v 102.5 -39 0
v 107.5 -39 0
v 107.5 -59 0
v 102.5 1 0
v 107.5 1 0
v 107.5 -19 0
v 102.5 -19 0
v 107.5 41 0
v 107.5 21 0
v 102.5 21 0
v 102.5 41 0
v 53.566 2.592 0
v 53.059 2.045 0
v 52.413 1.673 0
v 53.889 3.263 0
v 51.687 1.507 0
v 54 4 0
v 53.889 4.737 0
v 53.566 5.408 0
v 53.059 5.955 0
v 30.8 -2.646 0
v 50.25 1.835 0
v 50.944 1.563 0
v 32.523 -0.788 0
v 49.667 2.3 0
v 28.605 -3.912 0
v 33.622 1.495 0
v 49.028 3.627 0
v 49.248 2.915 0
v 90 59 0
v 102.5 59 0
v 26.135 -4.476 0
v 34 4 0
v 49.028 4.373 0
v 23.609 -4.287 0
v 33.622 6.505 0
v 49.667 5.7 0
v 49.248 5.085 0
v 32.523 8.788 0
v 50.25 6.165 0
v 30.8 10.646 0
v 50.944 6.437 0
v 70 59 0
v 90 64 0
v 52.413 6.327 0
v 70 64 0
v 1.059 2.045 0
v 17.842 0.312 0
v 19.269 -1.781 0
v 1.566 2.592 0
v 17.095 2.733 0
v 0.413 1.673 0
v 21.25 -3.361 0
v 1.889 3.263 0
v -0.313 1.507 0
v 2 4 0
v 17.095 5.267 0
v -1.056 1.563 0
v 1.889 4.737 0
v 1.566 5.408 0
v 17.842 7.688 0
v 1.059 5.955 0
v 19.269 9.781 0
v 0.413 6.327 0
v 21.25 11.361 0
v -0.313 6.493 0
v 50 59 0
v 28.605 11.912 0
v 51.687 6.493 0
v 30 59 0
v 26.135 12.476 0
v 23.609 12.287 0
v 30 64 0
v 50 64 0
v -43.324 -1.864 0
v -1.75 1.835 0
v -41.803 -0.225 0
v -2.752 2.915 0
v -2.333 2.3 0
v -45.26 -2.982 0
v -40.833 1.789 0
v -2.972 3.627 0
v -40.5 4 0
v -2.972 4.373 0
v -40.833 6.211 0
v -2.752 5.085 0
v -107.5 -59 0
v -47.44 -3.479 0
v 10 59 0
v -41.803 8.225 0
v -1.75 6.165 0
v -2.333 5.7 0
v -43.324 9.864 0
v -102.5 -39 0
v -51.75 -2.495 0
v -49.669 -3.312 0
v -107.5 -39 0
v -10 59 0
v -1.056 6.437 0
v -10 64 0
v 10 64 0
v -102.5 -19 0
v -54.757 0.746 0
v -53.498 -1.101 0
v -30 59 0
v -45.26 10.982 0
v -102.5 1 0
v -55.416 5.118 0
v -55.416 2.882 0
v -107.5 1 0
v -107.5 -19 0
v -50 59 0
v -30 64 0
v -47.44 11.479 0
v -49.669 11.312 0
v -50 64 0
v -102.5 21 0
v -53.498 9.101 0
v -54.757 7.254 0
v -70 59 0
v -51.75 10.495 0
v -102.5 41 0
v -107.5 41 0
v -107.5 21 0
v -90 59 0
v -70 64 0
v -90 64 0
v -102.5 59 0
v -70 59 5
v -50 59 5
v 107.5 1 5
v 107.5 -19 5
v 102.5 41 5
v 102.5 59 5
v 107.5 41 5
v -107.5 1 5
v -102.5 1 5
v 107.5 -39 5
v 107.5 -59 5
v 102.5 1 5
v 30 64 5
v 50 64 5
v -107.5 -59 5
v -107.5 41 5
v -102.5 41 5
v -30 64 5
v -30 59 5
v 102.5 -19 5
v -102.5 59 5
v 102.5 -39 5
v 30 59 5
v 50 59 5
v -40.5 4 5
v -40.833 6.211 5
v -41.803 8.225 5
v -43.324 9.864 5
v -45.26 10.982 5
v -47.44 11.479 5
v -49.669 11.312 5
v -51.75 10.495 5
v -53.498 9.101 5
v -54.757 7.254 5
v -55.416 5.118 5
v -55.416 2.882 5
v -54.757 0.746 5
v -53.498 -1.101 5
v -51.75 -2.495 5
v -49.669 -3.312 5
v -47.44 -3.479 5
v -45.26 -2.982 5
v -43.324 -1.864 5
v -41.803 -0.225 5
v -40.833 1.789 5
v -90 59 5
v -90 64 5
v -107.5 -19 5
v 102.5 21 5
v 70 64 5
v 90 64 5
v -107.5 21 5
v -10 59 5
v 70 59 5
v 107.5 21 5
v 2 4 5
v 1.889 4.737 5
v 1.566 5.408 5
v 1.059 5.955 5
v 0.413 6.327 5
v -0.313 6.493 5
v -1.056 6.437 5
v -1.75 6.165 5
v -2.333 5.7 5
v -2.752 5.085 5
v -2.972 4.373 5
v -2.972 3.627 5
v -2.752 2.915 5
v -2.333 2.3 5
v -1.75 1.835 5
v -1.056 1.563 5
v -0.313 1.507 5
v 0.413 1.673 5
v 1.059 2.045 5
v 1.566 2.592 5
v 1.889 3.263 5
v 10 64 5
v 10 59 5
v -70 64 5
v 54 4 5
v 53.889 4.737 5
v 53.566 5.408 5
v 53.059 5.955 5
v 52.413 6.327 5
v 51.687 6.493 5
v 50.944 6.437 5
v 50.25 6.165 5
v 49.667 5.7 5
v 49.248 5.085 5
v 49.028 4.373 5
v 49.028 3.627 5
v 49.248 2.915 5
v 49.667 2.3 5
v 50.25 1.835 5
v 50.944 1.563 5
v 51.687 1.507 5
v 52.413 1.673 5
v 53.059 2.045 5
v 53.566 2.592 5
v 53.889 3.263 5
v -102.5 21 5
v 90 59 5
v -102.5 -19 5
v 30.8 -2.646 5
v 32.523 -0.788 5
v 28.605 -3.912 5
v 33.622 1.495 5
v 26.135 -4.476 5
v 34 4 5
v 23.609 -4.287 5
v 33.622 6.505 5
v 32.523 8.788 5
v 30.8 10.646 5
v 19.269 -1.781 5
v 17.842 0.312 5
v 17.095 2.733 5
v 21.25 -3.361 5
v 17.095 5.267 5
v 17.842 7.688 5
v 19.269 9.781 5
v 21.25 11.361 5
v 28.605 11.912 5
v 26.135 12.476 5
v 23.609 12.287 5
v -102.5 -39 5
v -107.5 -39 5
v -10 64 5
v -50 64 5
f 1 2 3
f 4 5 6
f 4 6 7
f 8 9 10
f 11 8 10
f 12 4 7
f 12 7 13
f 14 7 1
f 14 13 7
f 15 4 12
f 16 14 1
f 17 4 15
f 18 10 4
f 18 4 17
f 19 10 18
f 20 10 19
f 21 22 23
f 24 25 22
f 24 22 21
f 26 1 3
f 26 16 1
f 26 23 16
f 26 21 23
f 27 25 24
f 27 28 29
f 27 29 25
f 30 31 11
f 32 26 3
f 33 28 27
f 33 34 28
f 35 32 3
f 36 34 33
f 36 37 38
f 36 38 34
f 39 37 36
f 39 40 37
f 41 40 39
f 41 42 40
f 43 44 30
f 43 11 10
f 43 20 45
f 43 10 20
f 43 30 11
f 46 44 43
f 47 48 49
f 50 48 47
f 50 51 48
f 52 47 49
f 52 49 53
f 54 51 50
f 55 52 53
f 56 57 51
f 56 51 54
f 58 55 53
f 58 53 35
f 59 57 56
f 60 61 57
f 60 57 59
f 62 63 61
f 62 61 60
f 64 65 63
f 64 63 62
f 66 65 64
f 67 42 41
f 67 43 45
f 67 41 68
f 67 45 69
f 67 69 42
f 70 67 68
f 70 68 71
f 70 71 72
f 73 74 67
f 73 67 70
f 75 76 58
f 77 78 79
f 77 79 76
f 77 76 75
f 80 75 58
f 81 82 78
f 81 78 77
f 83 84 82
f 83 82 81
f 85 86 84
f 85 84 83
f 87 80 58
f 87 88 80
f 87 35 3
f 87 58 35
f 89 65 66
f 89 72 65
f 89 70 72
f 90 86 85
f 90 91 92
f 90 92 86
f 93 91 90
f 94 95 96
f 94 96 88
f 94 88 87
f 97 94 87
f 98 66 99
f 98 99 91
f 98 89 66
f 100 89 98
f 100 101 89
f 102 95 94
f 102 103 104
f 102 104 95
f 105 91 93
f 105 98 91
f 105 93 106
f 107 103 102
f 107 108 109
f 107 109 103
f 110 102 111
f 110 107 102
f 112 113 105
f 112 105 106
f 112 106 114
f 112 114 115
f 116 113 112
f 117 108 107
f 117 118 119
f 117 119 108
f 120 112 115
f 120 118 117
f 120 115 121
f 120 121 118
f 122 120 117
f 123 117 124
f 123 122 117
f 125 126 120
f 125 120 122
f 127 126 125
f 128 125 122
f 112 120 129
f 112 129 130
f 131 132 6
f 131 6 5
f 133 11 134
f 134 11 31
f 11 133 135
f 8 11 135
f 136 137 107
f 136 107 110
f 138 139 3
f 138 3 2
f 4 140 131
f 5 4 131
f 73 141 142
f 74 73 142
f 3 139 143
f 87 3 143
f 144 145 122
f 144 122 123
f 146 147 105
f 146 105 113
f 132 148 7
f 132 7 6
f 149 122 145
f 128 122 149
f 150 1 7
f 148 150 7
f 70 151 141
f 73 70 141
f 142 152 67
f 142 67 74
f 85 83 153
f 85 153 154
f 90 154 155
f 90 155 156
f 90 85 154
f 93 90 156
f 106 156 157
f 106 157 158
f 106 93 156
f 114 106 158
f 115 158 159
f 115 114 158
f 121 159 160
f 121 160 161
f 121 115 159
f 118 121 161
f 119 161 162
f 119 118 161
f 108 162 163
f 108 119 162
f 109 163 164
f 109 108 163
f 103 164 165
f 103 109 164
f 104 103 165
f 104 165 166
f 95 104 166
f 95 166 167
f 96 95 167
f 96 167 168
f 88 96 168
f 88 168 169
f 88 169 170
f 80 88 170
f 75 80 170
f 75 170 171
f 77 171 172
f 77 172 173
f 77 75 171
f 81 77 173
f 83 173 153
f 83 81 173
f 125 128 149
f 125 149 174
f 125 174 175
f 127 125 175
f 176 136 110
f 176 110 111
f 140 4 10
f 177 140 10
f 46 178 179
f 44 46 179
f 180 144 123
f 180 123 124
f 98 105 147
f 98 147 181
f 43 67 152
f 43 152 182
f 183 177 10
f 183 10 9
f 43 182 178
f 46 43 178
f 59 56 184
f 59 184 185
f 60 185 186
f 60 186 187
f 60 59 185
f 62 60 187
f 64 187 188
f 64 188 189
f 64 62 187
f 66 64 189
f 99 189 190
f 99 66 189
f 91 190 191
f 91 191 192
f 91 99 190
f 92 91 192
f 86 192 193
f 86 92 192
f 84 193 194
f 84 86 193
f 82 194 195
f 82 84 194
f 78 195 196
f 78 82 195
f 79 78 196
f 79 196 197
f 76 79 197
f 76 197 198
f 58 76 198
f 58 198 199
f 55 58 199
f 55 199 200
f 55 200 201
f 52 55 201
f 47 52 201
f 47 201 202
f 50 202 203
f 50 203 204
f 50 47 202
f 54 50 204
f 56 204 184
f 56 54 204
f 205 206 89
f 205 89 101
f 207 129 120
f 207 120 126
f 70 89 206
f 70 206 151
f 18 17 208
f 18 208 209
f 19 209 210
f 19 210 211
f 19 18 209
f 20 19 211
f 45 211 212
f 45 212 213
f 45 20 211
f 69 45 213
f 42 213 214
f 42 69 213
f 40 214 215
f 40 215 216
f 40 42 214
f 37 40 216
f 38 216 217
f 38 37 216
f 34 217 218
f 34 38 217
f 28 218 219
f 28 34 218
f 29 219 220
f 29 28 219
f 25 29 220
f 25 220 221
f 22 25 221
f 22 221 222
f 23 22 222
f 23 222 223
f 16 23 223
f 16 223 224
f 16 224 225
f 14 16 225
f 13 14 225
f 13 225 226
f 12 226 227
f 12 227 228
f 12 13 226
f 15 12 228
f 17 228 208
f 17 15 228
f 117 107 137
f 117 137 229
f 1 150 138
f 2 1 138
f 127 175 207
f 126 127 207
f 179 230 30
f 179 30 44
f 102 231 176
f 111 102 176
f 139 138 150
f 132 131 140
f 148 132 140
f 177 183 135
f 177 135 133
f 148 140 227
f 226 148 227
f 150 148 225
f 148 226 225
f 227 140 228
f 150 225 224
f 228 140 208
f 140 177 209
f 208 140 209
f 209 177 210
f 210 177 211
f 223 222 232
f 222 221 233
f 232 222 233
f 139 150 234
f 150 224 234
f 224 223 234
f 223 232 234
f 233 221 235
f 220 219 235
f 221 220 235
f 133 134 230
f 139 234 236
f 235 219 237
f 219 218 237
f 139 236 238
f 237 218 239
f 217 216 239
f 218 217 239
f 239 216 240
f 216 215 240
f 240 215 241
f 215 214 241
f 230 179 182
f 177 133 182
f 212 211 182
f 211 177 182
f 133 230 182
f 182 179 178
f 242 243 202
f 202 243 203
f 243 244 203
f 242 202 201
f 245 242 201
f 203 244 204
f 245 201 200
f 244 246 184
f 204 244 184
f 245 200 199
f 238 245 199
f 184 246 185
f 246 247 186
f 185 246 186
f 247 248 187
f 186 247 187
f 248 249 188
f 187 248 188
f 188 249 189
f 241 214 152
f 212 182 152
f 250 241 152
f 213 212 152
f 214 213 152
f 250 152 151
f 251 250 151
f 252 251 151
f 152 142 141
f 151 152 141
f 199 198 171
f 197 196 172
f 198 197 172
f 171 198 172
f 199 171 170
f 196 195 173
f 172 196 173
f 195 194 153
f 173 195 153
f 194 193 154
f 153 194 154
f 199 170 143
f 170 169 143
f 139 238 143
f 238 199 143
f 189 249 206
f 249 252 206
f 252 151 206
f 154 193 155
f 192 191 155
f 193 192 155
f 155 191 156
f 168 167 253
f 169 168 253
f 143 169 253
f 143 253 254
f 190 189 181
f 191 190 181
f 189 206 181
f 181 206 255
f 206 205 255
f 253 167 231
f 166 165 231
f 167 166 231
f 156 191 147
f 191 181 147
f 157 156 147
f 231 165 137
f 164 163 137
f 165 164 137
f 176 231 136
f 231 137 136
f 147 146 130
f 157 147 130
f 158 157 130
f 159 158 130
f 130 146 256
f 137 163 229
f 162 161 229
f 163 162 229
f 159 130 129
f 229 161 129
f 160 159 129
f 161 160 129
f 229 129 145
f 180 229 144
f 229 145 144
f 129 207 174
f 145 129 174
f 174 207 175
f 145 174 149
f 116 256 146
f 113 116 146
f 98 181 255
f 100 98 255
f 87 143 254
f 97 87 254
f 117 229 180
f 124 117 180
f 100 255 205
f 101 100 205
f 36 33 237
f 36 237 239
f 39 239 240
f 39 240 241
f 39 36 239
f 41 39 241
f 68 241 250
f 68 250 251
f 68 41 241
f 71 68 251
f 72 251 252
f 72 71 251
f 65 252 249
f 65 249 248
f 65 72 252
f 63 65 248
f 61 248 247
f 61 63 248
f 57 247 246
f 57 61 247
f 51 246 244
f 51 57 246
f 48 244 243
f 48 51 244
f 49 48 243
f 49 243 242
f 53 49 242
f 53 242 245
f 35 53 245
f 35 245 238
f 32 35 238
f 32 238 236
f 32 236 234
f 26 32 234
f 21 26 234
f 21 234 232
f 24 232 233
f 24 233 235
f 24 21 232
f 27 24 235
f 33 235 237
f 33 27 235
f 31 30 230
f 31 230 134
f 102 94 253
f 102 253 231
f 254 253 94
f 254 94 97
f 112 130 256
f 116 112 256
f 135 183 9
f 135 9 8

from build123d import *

# Parameters (mm, degrees)
SKETCH_1_W               = 205
SKETCH_1_H               = 118
SKETCH_1_R               = 8.5
SKETCH_1_R_2             = 7.5
SKETCH_1_R_3             = 2.5
EXTRUDE_1_DEPTH          = 5
SKETCH_2_W               = 5
SKETCH_2_H               = 20
EXTRUDE_2_DEPTH          = 5
PATTERN_LINEAR_2_COUNT   = 3
PATTERN_LINEAR_2_PITCH   = 40
MIRROR_2_COPY_1_SKETCH_W = 5
MIRROR_2_COPY_1_SKETCH_H = 20
MIRROR_2_COPY_1_DEPTH    = 5
MIRROR_2_COPY_2_SKETCH_W = 5
MIRROR_2_COPY_2_SKETCH_H = 20
MIRROR_2_COPY_2_DEPTH    = 5
SKETCH_3_W               = 20
SKETCH_3_H               = 5
EXTRUDE_3_DEPTH          = 5
PATTERN_LINEAR_3_COUNT   = 3
PATTERN_LINEAR_3_PITCH   = 40
PATTERN_LINEAR_4_COUNT   = 3
PATTERN_LINEAR_4_PITCH   = 40


with BuildPart() as part:
    # 스케치1 → 보스-돌출1 (new body)
    with BuildSketch(Plane.XY):
        Rectangle(SKETCH_1_W, SKETCH_1_H)
        with Locations((25.5, 4)):
            Circle(SKETCH_1_R, mode=Mode.SUBTRACT)
        with Locations((-48, 4)):
            Circle(SKETCH_1_R_2, mode=Mode.SUBTRACT)
        with Locations((-0.5, 4)):
            Circle(SKETCH_1_R_3, mode=Mode.SUBTRACT)
        with Locations((51.5, 4)):
            Circle(SKETCH_1_R_3, mode=Mode.SUBTRACT)
    extrude(amount=EXTRUDE_1_DEPTH)

    # 스케치2 → 보스-돌출2 (add)
    with BuildSketch(Plane.XY.offset(5)):
        with Locations((105, -49)):
            Rectangle(SKETCH_2_W, SKETCH_2_H)
    extrude_2 = extrude(amount=-EXTRUDE_2_DEPTH)

    # 선형 패턴2: 보스-돌출2 ×3
    with Locations(*[(0, i * PATTERN_LINEAR_2_PITCH, 0) for i in range(1, PATTERN_LINEAR_2_COUNT)]):
        add(extrude_2)

    # 대칭 복사2: 보스-돌출2 across plane
    add(extrude_2.mirror(Plane(origin=(0, 0, 0), x_dir=(0, 0, 1), z_dir=(1, 0, 0))))

    # 대칭 복사2 copy 1 sketch → 대칭 복사2 copy 1 (add)
    with BuildSketch(Plane(origin=(0, 40, 5), x_dir=(-1, 0, 0), z_dir=(0, 0, 1))):
        with Locations((105, 49)):
            Rectangle(MIRROR_2_COPY_1_SKETCH_W, MIRROR_2_COPY_1_SKETCH_H)
    extrude(amount=-MIRROR_2_COPY_1_DEPTH)

    # 대칭 복사2 copy 2 sketch → 대칭 복사2 copy 2 (add)
    with BuildSketch(Plane(origin=(0, 80, 5), x_dir=(-1, 0, 0), z_dir=(0, 0, 1))):
        with Locations((105, 49)):
            Rectangle(MIRROR_2_COPY_2_SKETCH_W, MIRROR_2_COPY_2_SKETCH_H)
    extrude(amount=-MIRROR_2_COPY_2_DEPTH)

    # 스케치3 → 보스-돌출3 (add)
    with BuildSketch(Plane.XY.offset(5)):
        with Locations((0, 61.5)):
            Rectangle(SKETCH_3_W, SKETCH_3_H)
    extrude_3 = extrude(amount=-EXTRUDE_3_DEPTH)

    # 선형 패턴3: 보스-돌출3 ×3
    with Locations(*[(i * PATTERN_LINEAR_3_PITCH, 0, 0) for i in range(1, PATTERN_LINEAR_3_COUNT)]):
        add(extrude_3)

    # 선형 패턴4: 보스-돌출3 ×3
    with Locations(*[(-i * PATTERN_LINEAR_4_PITCH, 0, 0) for i in range(1, PATTERN_LINEAR_4_COUNT)]):
        add(extrude_3)


solid = part.part
